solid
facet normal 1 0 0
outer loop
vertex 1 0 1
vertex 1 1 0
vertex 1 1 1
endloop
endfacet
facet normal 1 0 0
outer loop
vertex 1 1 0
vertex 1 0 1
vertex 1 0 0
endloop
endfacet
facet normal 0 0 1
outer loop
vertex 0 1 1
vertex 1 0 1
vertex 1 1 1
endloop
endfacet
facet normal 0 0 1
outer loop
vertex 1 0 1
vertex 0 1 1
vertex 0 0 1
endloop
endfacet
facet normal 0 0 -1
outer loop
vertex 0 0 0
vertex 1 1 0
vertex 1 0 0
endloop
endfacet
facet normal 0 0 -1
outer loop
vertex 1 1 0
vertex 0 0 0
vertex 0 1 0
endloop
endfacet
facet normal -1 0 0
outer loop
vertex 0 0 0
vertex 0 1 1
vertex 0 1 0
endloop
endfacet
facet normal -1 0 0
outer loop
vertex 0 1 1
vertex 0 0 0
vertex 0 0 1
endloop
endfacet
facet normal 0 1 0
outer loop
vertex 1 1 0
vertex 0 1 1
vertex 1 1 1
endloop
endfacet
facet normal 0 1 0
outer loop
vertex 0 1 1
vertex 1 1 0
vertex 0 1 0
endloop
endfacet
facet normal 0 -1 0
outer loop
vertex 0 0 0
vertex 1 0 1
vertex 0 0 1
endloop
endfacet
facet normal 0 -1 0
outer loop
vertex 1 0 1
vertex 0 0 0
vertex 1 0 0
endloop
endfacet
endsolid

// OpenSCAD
echo(version(1), search("a", "abc", 1, 2, 3), search("a", "abc", 0, 0, 0));
module a() child([1, 0]);
a() { cube(1); sphere(2); }
module b() child("x");
b() { cube(1); sphere(2); }
module d() child([0:1]);
d() { cube(1); sphere(2); }
